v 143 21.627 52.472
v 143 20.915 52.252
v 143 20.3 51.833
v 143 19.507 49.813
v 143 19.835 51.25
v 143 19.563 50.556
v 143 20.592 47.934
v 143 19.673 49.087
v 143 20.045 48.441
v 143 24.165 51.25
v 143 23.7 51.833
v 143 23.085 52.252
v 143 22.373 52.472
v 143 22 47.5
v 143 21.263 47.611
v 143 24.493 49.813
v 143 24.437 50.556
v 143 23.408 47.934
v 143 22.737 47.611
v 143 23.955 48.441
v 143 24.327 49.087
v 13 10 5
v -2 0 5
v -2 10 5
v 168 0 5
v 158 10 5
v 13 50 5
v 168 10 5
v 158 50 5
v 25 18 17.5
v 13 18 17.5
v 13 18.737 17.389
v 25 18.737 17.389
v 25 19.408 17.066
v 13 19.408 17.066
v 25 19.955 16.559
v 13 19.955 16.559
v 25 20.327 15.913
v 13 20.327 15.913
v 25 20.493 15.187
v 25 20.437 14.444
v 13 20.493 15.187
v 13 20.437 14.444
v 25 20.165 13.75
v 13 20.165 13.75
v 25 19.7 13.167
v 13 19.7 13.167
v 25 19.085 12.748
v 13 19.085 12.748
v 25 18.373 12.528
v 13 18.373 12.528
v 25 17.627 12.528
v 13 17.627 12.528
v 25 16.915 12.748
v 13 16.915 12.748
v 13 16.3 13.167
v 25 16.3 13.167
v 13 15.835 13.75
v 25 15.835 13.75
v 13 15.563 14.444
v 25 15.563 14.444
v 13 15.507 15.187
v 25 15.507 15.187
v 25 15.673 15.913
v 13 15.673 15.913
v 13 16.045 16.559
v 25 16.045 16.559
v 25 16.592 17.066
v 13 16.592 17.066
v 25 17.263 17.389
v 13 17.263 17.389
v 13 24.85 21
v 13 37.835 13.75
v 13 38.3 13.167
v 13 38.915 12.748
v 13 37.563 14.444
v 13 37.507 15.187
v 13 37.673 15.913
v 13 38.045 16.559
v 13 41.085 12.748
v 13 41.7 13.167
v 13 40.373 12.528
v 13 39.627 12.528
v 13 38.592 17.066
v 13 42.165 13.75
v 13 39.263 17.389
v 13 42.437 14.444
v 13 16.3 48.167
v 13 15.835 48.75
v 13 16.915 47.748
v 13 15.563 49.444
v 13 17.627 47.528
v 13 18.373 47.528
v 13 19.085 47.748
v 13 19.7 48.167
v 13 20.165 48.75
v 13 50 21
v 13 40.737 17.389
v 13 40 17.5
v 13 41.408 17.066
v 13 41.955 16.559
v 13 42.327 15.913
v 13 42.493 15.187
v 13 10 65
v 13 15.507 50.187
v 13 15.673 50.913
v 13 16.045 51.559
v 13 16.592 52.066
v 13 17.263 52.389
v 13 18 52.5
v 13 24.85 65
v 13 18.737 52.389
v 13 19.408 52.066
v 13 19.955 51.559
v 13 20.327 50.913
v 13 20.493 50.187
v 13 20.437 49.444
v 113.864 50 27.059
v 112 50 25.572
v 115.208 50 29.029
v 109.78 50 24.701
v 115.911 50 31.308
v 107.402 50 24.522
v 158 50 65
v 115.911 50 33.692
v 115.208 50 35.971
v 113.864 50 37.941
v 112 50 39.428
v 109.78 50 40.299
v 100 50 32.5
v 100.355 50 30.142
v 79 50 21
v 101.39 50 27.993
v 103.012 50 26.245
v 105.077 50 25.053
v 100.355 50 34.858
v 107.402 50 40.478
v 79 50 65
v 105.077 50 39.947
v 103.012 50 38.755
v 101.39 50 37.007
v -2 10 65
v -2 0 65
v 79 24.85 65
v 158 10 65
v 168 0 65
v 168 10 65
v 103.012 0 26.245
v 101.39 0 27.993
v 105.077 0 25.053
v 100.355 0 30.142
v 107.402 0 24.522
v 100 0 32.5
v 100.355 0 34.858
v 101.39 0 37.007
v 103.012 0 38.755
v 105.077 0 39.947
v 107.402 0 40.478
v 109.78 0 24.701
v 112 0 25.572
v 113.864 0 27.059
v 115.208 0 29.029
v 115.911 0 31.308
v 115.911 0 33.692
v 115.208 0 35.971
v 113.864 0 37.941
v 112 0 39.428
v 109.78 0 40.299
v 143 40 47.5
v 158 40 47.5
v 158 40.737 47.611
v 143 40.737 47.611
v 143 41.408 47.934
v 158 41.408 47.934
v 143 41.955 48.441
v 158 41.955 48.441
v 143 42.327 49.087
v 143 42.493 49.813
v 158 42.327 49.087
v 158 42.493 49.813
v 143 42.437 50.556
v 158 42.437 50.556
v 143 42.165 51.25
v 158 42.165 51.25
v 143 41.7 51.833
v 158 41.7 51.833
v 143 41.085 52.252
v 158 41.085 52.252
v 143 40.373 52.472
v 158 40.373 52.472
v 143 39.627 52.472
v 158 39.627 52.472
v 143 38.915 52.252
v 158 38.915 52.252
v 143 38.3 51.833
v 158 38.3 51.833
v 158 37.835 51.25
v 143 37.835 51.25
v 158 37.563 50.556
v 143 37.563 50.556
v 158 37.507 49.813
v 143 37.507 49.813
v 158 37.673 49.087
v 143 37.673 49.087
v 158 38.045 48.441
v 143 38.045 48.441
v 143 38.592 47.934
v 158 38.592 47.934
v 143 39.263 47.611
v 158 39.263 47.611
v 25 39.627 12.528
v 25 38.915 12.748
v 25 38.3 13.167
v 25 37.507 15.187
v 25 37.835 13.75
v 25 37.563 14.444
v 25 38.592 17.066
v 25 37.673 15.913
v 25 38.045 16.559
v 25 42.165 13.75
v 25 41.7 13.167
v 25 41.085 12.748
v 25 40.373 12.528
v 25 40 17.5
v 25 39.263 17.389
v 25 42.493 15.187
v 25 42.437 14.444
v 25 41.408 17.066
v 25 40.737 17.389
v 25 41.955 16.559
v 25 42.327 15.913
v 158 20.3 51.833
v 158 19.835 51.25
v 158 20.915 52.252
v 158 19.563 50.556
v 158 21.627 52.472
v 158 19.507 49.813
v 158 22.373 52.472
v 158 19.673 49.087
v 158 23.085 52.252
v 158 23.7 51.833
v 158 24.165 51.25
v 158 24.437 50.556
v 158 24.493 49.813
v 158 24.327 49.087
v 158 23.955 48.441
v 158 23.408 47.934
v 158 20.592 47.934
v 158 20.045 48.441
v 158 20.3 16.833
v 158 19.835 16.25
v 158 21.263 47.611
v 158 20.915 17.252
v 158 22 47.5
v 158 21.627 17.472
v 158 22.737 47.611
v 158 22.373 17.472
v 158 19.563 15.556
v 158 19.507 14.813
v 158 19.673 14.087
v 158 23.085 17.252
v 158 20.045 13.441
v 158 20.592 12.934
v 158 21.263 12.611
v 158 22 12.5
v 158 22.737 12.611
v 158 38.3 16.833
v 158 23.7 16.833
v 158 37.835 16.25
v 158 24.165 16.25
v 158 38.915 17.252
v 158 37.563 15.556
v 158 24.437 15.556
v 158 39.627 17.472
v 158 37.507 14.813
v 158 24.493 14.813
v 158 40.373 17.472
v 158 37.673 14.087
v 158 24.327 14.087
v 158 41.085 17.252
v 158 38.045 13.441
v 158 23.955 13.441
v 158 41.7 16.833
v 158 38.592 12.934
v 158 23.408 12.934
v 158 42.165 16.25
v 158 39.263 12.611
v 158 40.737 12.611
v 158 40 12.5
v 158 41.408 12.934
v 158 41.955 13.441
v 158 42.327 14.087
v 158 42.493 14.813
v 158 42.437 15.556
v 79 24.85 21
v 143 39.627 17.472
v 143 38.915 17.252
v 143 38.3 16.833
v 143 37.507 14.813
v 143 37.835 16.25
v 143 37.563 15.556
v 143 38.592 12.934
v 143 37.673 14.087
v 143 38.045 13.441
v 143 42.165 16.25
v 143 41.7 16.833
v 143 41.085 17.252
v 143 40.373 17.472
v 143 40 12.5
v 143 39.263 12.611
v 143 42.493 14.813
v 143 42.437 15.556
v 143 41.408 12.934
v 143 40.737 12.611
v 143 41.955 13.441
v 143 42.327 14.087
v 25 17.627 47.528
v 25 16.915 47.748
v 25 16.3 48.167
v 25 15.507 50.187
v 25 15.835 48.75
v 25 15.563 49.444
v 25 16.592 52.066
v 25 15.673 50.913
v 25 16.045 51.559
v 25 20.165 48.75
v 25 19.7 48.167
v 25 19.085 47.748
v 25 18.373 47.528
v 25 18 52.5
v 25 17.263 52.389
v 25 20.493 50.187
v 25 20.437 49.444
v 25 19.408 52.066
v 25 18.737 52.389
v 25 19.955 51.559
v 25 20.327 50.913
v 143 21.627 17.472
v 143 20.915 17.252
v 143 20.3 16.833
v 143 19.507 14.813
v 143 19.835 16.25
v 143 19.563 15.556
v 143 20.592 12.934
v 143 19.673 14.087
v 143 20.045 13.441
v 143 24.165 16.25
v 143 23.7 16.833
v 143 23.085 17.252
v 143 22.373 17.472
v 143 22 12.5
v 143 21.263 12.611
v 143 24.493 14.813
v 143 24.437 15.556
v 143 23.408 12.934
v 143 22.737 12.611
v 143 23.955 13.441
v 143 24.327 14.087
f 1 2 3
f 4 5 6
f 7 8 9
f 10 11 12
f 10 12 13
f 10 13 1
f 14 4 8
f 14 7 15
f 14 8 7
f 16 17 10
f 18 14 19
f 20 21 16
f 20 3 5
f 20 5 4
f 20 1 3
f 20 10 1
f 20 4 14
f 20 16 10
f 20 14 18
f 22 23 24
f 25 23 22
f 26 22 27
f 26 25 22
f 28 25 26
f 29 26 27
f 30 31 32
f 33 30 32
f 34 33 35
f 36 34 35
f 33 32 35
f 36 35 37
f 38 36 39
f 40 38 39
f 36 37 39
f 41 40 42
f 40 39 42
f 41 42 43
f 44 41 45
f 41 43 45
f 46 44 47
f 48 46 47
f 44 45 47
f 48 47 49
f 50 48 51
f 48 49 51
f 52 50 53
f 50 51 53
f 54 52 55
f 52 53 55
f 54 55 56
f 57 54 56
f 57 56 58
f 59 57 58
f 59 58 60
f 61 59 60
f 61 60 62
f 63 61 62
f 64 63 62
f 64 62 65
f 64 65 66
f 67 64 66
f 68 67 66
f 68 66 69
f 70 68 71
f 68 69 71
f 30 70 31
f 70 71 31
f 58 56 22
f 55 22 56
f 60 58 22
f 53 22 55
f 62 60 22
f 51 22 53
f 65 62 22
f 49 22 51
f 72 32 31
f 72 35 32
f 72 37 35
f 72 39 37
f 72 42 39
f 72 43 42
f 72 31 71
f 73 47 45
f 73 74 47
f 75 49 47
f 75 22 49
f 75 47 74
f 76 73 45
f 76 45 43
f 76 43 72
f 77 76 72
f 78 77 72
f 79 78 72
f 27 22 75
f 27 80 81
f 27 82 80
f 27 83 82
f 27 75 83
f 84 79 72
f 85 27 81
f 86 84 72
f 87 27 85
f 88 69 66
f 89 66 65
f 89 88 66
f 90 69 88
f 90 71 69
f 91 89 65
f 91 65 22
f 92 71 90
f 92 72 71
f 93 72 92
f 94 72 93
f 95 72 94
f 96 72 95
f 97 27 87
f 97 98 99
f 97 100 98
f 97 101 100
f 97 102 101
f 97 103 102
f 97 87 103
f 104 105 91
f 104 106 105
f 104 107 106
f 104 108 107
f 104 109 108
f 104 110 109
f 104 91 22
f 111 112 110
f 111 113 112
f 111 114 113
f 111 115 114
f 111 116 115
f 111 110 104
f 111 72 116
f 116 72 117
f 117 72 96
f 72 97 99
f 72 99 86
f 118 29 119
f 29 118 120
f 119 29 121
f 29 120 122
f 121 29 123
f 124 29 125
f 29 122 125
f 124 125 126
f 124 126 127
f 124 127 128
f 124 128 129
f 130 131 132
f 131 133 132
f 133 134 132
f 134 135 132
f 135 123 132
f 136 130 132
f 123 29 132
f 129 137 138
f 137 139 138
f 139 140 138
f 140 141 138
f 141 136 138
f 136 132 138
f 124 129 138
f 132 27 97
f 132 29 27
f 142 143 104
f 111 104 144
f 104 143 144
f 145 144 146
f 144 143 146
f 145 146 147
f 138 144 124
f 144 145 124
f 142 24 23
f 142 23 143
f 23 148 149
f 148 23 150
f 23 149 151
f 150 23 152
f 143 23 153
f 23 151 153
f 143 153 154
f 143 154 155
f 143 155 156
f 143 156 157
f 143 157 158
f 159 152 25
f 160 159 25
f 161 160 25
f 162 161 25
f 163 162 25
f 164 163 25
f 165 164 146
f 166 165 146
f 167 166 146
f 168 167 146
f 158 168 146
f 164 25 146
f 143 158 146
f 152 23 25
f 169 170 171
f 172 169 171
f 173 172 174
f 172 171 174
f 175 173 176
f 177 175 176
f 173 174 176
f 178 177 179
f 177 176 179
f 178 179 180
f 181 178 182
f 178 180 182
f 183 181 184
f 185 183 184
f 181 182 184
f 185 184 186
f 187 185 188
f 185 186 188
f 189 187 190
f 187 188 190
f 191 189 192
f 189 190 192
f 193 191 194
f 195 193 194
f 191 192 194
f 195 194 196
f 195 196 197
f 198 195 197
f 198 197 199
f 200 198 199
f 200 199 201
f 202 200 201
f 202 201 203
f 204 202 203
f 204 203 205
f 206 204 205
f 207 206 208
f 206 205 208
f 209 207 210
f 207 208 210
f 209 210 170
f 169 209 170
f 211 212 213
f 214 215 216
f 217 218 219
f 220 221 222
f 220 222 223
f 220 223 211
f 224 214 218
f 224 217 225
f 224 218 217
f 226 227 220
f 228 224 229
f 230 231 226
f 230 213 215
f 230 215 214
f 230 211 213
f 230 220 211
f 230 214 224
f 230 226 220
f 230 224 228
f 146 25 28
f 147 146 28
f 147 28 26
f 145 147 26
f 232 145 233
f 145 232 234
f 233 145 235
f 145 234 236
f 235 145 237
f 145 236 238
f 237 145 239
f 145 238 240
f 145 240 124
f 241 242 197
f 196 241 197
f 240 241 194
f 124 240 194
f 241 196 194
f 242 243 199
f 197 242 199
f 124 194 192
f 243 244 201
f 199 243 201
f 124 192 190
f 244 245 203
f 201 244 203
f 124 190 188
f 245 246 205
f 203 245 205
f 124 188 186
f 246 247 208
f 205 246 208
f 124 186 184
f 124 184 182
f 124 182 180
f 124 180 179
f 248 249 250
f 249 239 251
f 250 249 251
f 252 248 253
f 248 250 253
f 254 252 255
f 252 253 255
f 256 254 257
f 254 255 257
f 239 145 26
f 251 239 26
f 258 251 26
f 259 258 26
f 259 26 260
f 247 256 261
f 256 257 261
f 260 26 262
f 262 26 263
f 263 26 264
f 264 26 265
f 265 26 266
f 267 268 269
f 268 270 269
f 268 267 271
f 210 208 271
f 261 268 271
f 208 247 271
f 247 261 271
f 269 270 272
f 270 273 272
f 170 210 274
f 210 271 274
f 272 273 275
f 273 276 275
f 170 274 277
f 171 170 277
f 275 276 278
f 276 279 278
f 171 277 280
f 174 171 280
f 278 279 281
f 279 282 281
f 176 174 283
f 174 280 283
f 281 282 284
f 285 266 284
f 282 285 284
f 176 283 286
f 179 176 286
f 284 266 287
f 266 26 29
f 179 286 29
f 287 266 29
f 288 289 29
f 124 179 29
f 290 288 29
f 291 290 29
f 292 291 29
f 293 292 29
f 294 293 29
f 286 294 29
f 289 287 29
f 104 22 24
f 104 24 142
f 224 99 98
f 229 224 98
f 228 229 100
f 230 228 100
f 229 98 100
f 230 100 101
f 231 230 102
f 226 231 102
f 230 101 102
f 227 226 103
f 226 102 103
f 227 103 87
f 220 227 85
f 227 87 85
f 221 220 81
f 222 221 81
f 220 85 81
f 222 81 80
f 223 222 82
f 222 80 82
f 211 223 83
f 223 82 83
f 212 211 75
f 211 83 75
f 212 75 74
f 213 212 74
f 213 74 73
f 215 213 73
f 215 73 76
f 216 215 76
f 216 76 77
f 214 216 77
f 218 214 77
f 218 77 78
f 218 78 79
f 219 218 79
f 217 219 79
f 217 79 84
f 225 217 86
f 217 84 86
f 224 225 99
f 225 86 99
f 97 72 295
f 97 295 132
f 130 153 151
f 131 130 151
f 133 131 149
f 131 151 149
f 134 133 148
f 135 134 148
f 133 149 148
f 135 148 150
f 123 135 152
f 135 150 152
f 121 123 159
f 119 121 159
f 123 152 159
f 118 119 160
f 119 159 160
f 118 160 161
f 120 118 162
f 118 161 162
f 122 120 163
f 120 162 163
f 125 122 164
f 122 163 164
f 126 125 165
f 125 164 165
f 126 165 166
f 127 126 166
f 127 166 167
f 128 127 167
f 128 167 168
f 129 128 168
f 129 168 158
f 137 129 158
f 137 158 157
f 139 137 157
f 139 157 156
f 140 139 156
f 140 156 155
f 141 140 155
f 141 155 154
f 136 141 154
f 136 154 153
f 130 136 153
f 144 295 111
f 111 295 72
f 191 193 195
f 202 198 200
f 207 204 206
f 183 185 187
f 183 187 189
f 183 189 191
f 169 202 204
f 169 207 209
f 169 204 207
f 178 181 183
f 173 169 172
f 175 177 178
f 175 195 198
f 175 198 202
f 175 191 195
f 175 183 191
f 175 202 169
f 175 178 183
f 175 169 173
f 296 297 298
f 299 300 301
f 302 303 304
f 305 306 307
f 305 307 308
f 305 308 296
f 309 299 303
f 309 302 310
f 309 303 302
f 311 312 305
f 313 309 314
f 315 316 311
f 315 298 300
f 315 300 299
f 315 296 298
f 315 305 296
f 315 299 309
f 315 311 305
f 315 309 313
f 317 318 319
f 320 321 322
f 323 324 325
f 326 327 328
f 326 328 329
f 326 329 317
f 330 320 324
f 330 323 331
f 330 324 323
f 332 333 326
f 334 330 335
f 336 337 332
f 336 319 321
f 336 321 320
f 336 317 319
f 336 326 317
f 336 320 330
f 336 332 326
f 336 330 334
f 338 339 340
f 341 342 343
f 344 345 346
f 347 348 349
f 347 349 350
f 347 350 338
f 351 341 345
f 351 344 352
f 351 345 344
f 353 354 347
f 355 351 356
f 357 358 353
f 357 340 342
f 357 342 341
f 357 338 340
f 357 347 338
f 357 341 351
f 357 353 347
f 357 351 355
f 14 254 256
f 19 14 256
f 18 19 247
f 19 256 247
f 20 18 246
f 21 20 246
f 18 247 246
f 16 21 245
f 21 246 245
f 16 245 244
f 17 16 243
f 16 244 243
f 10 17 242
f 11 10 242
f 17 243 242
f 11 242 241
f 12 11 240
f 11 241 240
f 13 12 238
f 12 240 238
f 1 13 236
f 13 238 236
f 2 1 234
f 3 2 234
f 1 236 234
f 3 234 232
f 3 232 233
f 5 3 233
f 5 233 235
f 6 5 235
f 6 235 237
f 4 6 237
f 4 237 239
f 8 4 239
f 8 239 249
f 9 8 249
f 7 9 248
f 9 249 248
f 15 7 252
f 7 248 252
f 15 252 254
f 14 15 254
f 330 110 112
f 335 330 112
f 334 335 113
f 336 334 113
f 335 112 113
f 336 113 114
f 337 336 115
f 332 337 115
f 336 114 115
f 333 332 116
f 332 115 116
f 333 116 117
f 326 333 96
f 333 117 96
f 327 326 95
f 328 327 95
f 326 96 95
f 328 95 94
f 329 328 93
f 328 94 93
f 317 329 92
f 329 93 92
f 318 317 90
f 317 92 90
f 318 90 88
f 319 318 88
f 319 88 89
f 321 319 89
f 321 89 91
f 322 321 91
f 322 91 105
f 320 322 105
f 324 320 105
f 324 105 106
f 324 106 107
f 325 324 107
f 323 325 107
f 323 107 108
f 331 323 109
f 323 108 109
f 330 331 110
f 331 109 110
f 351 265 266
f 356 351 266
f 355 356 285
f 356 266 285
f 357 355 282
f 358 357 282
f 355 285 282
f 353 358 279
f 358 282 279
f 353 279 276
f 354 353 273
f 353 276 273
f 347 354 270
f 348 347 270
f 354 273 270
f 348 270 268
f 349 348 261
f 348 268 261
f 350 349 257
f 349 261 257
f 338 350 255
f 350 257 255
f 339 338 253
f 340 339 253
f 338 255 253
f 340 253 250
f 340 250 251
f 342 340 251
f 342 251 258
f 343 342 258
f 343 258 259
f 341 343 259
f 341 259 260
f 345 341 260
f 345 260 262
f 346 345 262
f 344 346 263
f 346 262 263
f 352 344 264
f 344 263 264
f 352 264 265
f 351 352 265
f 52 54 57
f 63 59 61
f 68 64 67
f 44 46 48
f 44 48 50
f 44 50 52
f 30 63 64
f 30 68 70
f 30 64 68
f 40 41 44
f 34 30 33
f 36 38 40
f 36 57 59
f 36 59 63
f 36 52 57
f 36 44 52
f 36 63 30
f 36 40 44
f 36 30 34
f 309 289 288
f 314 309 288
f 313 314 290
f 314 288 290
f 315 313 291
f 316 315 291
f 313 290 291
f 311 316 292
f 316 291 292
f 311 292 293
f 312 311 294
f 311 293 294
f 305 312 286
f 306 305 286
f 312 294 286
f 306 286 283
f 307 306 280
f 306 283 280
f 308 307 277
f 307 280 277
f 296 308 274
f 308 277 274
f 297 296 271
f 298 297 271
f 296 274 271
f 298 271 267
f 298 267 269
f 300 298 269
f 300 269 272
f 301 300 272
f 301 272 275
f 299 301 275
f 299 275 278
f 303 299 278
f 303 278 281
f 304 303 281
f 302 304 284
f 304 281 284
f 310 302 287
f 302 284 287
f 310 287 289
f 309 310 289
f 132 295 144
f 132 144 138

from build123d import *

# Parameters (mm, degrees)
AUFSATZ_LINEAR_AUSTRAGEN1_DEPTH = 65
SKIZZE3_R                       = 8
SCHNITT_LINEAR_AUSTRAGEN2_DEPTH = 85
SKIZZE4_W                       = 66
SKIZZE4_H                       = 25.15
SCHNITT_LINEAR_AUSTRAGEN3_DEPTH = 120
SKIZZE5_R                       = 2.5
SCHNITT_LINEAR_AUSTRAGEN4_DEPTH = 15
SKIZZE6_R                       = 2.5
SCHNITT_LINEAR_AUSTRAGEN5_DEPTH = 12
SKIZZE7_W                       = 21
SKIZZE7_H                       = 25.15
AUFSATZ_LINEAR_AUSTRAGEN2_DEPTH = 66
SKIZZE8_R                       = 2.5
SCHNITT_LINEAR_AUSTRAGEN7_DEPTH = 12
SCHNITT_LINEAR_AUSTRAGEN8_DEPTH = 5
SKIZZE10_W                      = 60
SKIZZE10_H                      = 10
AUFSATZ_LINEAR_AUSTRAGEN3_DEPTH = 2


with BuildPart() as part:
    # Skizze1 → Aufsatz-Linear austragen1 (new body)
    with BuildSketch(Plane.XY):
        Polygon((0, 0), (168, 0), (168, 10), (158, 10), (158, 50), (13, 50), (13, 10), (0, 10), align=None)
    extrude(amount=AUFSATZ_LINEAR_AUSTRAGEN1_DEPTH)

    # Skizze3 → Schnitt-Linear austragen2 (cut)
    with BuildSketch(Plane(origin=(0, 0, 0), x_dir=(-1, 0, 0), z_dir=(0, -1, 0))):
        with Locations((-108, -32.5)):
            Circle(SKIZZE3_R)
    extrude(amount=-SCHNITT_LINEAR_AUSTRAGEN2_DEPTH, mode=Mode.SUBTRACT)

    # Skizze4 → Schnitt-Linear austragen3 (cut)
    with BuildSketch(Plane(origin=(0, 0, 0), x_dir=(-1, 0, 0), z_dir=(0, 0, -1))):
        with Locations((-46, 37.425)):
            Rectangle(SKIZZE4_W, SKIZZE4_H)
    extrude(amount=-SCHNITT_LINEAR_AUSTRAGEN3_DEPTH, mode=Mode.SUBTRACT)

    # Skizze5 → Schnitt-Linear austragen4 (cut)
    with BuildSketch(Plane(origin=(158, 0, 0), x_dir=(0, 0, -1), z_dir=(1, 0, 0))):
        with Locations((-50, 40)):
            Circle(SKIZZE5_R)
        with Locations((-50, 22)):
            Circle(SKIZZE5_R)
        with Locations((-15, 22)):
            Circle(SKIZZE5_R)
        with Locations((-15, 40)):
            Circle(SKIZZE5_R)
    extrude(amount=-SCHNITT_LINEAR_AUSTRAGEN4_DEPTH, mode=Mode.SUBTRACT)

    # Skizze6 → Schnitt-Linear austragen5 (cut)
    with BuildSketch(Plane.ZY.offset(-13)):
        with Locations((15, 18)):
            Circle(SKIZZE6_R)
        with Locations((50, 18)):
            Circle(SKIZZE6_R)
    extrude(amount=-SCHNITT_LINEAR_AUSTRAGEN5_DEPTH, mode=Mode.SUBTRACT)

    # Skizze7 → Aufsatz-Linear austragen2 (add)
    with BuildSketch(Plane.ZY.offset(-13)):
        with Locations((10.5, 37.425)):
            Rectangle(SKIZZE7_W, SKIZZE7_H)
    extrude(amount=-AUFSATZ_LINEAR_AUSTRAGEN2_DEPTH)

    # Skizze8 → Schnitt-Linear austragen7 (cut)
    with BuildSketch(Plane.ZY.offset(-13)):
        with Locations((15, 40)):
            Circle(SKIZZE8_R)
    extrude(amount=-SCHNITT_LINEAR_AUSTRAGEN7_DEPTH, mode=Mode.SUBTRACT)

    # Skizze9 → Schnitt-Linear austragen8 (cut)
    with BuildSketch(Plane(origin=(0, 0, 0), x_dir=(-1, 0, 0), z_dir=(0, 0, -1))):
        Polygon((0, 0), (0, 10), (-13, 10), (-13, 50), (-158, 50), (-158, 10), (-168, 10), (-168, 0), align=None)
    extrude(amount=-SCHNITT_LINEAR_AUSTRAGEN8_DEPTH, mode=Mode.SUBTRACT)

    # Skizze10 → Aufsatz-Linear austragen3 (add)
    with BuildSketch(Plane.ZY):
        with Locations((35, 5)):
            Rectangle(SKIZZE10_W, SKIZZE10_H)
    extrude(amount=AUFSATZ_LINEAR_AUSTRAGEN3_DEPTH)


solid = part.part
